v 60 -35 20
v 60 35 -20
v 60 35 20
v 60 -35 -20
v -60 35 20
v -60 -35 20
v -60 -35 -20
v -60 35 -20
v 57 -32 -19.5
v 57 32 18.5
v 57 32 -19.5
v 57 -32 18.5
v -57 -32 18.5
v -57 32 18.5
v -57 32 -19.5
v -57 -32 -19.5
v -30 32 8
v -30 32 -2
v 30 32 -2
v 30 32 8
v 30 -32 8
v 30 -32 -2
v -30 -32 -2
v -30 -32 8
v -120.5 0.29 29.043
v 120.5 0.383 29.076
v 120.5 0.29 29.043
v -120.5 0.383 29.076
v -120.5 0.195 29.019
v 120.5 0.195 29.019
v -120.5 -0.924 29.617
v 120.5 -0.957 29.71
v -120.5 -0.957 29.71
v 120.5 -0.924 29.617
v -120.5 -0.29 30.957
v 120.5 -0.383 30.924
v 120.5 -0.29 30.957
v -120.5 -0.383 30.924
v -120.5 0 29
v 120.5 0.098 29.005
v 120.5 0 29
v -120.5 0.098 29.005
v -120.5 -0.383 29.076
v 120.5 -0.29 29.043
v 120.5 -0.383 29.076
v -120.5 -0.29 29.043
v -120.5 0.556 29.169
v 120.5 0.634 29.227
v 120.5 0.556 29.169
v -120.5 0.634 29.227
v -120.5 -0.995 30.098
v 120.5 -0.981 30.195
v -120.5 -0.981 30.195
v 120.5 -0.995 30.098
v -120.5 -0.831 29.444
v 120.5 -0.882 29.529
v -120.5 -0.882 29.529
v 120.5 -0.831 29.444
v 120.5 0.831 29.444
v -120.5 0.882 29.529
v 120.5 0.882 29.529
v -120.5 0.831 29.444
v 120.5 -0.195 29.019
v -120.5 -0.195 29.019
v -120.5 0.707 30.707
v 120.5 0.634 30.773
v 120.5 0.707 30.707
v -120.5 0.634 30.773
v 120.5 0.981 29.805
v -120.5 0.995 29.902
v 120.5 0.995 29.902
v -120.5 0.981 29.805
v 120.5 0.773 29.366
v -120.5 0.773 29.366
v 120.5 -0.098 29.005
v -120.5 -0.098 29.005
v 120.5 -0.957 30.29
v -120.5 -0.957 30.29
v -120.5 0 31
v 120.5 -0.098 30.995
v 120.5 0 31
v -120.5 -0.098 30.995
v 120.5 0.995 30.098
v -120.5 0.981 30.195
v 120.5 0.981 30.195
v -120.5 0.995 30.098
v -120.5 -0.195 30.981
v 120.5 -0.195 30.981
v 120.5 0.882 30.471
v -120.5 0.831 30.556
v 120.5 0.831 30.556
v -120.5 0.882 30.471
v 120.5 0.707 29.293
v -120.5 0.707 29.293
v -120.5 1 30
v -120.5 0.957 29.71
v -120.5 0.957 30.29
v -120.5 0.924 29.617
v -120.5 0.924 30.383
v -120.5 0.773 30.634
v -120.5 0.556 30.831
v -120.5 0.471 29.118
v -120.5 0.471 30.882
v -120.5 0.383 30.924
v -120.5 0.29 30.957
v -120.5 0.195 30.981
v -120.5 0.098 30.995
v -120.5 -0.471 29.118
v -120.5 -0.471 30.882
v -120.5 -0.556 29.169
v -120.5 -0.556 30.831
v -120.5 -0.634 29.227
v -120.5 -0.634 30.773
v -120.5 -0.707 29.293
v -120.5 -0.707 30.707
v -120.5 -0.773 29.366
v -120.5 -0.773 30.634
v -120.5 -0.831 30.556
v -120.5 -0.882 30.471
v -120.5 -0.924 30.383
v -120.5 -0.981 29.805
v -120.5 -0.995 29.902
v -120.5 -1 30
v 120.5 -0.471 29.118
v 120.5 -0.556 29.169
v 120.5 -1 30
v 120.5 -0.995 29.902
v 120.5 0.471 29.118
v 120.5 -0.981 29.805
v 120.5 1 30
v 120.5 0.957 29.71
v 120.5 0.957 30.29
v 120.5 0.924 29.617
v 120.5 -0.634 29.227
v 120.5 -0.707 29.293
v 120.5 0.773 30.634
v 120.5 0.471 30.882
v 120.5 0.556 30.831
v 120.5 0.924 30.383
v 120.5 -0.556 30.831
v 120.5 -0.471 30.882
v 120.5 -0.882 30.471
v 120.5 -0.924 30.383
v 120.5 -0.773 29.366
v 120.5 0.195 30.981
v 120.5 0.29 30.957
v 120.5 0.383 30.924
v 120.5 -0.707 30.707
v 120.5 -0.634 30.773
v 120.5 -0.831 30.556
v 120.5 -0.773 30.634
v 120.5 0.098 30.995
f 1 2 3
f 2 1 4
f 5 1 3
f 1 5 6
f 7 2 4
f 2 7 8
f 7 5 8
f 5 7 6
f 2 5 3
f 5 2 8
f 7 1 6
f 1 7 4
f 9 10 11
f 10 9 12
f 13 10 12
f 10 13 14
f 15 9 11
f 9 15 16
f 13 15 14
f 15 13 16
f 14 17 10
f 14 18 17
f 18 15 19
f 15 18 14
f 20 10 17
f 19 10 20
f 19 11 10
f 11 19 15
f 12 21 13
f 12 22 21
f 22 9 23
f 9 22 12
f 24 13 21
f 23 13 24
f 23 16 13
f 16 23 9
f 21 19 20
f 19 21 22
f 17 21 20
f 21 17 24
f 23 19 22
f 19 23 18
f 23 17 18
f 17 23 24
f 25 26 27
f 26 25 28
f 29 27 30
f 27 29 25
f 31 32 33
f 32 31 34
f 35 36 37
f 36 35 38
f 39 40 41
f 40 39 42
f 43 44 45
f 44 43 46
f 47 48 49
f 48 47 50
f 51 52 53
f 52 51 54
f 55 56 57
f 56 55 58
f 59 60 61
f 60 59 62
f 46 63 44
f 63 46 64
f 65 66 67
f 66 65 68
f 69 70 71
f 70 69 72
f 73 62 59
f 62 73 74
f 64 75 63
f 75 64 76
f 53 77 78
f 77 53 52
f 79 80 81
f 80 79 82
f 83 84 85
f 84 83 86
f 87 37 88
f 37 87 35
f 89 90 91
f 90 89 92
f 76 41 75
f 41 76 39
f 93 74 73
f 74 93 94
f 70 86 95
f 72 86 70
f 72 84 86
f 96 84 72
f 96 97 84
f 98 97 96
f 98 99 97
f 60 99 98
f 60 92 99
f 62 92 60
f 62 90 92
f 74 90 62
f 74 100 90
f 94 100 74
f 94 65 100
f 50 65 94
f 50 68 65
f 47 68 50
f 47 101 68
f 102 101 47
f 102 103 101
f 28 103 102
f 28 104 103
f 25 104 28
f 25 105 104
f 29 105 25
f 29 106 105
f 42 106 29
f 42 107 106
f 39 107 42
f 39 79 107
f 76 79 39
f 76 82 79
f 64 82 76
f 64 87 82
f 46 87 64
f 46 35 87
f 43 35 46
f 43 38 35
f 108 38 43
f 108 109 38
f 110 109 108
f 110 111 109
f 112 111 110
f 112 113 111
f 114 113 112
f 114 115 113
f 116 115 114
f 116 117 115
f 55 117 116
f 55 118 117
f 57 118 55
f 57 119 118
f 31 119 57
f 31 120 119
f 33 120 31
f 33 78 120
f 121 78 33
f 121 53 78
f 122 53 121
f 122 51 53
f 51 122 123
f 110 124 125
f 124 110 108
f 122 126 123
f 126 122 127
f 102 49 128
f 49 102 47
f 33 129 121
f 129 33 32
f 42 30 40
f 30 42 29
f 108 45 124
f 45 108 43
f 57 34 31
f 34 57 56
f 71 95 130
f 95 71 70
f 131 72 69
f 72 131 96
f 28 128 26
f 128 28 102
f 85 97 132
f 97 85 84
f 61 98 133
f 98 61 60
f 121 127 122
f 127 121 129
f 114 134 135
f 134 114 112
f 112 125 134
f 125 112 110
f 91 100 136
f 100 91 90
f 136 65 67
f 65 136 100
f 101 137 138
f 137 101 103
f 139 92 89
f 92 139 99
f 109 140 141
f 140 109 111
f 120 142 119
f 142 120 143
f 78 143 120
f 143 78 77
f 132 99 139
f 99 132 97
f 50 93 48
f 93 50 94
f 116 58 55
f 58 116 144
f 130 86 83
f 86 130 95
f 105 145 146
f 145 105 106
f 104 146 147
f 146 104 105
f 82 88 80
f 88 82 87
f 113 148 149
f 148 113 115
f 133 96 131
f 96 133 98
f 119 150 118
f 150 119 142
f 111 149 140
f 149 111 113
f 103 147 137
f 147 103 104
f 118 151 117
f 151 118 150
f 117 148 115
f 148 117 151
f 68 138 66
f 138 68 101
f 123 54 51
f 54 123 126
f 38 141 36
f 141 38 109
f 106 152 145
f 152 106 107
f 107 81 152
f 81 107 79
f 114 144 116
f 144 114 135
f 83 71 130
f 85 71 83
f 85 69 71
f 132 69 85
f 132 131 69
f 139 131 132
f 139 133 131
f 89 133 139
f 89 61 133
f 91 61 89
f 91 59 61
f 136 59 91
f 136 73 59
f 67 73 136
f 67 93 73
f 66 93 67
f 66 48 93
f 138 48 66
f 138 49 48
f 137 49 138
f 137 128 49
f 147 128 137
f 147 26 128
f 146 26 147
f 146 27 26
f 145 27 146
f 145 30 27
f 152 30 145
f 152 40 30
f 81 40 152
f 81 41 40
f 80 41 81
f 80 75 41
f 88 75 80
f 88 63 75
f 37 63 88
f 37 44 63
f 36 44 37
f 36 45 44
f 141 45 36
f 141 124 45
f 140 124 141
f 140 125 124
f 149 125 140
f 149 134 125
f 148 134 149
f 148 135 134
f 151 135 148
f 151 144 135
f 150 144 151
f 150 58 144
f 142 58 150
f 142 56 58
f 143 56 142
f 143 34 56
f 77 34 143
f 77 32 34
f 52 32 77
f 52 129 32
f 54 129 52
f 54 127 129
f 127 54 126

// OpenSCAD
// Buffer tank for mini horizontal gel-electrophoresis box
// Dimensions measured with calipers

// Outer dimensions
outer_x = 120;
outer_y = 70;
outer_z = 40;

// Wall and floor thickness
wall_thickness = 3;
floor_thickness = 3;

// Inner dimensions (derived)
inner_x = outer_x - 2 * wall_thickness;
inner_y = outer_y - 2 * wall_thickness;
inner_z = outer_z - floor_thickness;

// Gel tray platform
platform_x = 60;
platform_y = inner_y; // spans full inner width
platform_z = 10; // height above inner floor
platform_z_top = floor_thickness + platform_z; // absolute z of top surface (13)

// Electrode wire holes
hole_diameter = 2;
hole_y = 0; // centred in Y
hole_z = 30; // absolute z

// Resolution for curved shapes
$fn = 64;

// Main tank body (outer shell minus inner cavity)
difference() {
    // Outer block
    cube([outer_x, outer_y, outer_z], center = true);
    
    // Inner cavity (open top)
    // Extends slightly below floor and above top to ensure clean cuts
    translate([0, 0, -0.5])
        cube([inner_x, inner_y, inner_z + 1], center = true);
}

// Gel tray platform (solid raised structure in the middle)
translate([0, 0, floor_thickness])
    cube([platform_x, platform_y, platform_z], center = true);

// Electrode wire holes through end walls
// Left end wall hole
translate([-outer_x/2, hole_y, hole_z])
    rotate([0, 90, 0])
        cylinder(r = hole_diameter/2, h = outer_x + 1, center = true);

// Right end wall hole
translate([outer_x/2, hole_y, hole_z])
    rotate([0, 90, 0])
        cylinder(r = hole_diameter/2, h = outer_x + 1, center = true);
